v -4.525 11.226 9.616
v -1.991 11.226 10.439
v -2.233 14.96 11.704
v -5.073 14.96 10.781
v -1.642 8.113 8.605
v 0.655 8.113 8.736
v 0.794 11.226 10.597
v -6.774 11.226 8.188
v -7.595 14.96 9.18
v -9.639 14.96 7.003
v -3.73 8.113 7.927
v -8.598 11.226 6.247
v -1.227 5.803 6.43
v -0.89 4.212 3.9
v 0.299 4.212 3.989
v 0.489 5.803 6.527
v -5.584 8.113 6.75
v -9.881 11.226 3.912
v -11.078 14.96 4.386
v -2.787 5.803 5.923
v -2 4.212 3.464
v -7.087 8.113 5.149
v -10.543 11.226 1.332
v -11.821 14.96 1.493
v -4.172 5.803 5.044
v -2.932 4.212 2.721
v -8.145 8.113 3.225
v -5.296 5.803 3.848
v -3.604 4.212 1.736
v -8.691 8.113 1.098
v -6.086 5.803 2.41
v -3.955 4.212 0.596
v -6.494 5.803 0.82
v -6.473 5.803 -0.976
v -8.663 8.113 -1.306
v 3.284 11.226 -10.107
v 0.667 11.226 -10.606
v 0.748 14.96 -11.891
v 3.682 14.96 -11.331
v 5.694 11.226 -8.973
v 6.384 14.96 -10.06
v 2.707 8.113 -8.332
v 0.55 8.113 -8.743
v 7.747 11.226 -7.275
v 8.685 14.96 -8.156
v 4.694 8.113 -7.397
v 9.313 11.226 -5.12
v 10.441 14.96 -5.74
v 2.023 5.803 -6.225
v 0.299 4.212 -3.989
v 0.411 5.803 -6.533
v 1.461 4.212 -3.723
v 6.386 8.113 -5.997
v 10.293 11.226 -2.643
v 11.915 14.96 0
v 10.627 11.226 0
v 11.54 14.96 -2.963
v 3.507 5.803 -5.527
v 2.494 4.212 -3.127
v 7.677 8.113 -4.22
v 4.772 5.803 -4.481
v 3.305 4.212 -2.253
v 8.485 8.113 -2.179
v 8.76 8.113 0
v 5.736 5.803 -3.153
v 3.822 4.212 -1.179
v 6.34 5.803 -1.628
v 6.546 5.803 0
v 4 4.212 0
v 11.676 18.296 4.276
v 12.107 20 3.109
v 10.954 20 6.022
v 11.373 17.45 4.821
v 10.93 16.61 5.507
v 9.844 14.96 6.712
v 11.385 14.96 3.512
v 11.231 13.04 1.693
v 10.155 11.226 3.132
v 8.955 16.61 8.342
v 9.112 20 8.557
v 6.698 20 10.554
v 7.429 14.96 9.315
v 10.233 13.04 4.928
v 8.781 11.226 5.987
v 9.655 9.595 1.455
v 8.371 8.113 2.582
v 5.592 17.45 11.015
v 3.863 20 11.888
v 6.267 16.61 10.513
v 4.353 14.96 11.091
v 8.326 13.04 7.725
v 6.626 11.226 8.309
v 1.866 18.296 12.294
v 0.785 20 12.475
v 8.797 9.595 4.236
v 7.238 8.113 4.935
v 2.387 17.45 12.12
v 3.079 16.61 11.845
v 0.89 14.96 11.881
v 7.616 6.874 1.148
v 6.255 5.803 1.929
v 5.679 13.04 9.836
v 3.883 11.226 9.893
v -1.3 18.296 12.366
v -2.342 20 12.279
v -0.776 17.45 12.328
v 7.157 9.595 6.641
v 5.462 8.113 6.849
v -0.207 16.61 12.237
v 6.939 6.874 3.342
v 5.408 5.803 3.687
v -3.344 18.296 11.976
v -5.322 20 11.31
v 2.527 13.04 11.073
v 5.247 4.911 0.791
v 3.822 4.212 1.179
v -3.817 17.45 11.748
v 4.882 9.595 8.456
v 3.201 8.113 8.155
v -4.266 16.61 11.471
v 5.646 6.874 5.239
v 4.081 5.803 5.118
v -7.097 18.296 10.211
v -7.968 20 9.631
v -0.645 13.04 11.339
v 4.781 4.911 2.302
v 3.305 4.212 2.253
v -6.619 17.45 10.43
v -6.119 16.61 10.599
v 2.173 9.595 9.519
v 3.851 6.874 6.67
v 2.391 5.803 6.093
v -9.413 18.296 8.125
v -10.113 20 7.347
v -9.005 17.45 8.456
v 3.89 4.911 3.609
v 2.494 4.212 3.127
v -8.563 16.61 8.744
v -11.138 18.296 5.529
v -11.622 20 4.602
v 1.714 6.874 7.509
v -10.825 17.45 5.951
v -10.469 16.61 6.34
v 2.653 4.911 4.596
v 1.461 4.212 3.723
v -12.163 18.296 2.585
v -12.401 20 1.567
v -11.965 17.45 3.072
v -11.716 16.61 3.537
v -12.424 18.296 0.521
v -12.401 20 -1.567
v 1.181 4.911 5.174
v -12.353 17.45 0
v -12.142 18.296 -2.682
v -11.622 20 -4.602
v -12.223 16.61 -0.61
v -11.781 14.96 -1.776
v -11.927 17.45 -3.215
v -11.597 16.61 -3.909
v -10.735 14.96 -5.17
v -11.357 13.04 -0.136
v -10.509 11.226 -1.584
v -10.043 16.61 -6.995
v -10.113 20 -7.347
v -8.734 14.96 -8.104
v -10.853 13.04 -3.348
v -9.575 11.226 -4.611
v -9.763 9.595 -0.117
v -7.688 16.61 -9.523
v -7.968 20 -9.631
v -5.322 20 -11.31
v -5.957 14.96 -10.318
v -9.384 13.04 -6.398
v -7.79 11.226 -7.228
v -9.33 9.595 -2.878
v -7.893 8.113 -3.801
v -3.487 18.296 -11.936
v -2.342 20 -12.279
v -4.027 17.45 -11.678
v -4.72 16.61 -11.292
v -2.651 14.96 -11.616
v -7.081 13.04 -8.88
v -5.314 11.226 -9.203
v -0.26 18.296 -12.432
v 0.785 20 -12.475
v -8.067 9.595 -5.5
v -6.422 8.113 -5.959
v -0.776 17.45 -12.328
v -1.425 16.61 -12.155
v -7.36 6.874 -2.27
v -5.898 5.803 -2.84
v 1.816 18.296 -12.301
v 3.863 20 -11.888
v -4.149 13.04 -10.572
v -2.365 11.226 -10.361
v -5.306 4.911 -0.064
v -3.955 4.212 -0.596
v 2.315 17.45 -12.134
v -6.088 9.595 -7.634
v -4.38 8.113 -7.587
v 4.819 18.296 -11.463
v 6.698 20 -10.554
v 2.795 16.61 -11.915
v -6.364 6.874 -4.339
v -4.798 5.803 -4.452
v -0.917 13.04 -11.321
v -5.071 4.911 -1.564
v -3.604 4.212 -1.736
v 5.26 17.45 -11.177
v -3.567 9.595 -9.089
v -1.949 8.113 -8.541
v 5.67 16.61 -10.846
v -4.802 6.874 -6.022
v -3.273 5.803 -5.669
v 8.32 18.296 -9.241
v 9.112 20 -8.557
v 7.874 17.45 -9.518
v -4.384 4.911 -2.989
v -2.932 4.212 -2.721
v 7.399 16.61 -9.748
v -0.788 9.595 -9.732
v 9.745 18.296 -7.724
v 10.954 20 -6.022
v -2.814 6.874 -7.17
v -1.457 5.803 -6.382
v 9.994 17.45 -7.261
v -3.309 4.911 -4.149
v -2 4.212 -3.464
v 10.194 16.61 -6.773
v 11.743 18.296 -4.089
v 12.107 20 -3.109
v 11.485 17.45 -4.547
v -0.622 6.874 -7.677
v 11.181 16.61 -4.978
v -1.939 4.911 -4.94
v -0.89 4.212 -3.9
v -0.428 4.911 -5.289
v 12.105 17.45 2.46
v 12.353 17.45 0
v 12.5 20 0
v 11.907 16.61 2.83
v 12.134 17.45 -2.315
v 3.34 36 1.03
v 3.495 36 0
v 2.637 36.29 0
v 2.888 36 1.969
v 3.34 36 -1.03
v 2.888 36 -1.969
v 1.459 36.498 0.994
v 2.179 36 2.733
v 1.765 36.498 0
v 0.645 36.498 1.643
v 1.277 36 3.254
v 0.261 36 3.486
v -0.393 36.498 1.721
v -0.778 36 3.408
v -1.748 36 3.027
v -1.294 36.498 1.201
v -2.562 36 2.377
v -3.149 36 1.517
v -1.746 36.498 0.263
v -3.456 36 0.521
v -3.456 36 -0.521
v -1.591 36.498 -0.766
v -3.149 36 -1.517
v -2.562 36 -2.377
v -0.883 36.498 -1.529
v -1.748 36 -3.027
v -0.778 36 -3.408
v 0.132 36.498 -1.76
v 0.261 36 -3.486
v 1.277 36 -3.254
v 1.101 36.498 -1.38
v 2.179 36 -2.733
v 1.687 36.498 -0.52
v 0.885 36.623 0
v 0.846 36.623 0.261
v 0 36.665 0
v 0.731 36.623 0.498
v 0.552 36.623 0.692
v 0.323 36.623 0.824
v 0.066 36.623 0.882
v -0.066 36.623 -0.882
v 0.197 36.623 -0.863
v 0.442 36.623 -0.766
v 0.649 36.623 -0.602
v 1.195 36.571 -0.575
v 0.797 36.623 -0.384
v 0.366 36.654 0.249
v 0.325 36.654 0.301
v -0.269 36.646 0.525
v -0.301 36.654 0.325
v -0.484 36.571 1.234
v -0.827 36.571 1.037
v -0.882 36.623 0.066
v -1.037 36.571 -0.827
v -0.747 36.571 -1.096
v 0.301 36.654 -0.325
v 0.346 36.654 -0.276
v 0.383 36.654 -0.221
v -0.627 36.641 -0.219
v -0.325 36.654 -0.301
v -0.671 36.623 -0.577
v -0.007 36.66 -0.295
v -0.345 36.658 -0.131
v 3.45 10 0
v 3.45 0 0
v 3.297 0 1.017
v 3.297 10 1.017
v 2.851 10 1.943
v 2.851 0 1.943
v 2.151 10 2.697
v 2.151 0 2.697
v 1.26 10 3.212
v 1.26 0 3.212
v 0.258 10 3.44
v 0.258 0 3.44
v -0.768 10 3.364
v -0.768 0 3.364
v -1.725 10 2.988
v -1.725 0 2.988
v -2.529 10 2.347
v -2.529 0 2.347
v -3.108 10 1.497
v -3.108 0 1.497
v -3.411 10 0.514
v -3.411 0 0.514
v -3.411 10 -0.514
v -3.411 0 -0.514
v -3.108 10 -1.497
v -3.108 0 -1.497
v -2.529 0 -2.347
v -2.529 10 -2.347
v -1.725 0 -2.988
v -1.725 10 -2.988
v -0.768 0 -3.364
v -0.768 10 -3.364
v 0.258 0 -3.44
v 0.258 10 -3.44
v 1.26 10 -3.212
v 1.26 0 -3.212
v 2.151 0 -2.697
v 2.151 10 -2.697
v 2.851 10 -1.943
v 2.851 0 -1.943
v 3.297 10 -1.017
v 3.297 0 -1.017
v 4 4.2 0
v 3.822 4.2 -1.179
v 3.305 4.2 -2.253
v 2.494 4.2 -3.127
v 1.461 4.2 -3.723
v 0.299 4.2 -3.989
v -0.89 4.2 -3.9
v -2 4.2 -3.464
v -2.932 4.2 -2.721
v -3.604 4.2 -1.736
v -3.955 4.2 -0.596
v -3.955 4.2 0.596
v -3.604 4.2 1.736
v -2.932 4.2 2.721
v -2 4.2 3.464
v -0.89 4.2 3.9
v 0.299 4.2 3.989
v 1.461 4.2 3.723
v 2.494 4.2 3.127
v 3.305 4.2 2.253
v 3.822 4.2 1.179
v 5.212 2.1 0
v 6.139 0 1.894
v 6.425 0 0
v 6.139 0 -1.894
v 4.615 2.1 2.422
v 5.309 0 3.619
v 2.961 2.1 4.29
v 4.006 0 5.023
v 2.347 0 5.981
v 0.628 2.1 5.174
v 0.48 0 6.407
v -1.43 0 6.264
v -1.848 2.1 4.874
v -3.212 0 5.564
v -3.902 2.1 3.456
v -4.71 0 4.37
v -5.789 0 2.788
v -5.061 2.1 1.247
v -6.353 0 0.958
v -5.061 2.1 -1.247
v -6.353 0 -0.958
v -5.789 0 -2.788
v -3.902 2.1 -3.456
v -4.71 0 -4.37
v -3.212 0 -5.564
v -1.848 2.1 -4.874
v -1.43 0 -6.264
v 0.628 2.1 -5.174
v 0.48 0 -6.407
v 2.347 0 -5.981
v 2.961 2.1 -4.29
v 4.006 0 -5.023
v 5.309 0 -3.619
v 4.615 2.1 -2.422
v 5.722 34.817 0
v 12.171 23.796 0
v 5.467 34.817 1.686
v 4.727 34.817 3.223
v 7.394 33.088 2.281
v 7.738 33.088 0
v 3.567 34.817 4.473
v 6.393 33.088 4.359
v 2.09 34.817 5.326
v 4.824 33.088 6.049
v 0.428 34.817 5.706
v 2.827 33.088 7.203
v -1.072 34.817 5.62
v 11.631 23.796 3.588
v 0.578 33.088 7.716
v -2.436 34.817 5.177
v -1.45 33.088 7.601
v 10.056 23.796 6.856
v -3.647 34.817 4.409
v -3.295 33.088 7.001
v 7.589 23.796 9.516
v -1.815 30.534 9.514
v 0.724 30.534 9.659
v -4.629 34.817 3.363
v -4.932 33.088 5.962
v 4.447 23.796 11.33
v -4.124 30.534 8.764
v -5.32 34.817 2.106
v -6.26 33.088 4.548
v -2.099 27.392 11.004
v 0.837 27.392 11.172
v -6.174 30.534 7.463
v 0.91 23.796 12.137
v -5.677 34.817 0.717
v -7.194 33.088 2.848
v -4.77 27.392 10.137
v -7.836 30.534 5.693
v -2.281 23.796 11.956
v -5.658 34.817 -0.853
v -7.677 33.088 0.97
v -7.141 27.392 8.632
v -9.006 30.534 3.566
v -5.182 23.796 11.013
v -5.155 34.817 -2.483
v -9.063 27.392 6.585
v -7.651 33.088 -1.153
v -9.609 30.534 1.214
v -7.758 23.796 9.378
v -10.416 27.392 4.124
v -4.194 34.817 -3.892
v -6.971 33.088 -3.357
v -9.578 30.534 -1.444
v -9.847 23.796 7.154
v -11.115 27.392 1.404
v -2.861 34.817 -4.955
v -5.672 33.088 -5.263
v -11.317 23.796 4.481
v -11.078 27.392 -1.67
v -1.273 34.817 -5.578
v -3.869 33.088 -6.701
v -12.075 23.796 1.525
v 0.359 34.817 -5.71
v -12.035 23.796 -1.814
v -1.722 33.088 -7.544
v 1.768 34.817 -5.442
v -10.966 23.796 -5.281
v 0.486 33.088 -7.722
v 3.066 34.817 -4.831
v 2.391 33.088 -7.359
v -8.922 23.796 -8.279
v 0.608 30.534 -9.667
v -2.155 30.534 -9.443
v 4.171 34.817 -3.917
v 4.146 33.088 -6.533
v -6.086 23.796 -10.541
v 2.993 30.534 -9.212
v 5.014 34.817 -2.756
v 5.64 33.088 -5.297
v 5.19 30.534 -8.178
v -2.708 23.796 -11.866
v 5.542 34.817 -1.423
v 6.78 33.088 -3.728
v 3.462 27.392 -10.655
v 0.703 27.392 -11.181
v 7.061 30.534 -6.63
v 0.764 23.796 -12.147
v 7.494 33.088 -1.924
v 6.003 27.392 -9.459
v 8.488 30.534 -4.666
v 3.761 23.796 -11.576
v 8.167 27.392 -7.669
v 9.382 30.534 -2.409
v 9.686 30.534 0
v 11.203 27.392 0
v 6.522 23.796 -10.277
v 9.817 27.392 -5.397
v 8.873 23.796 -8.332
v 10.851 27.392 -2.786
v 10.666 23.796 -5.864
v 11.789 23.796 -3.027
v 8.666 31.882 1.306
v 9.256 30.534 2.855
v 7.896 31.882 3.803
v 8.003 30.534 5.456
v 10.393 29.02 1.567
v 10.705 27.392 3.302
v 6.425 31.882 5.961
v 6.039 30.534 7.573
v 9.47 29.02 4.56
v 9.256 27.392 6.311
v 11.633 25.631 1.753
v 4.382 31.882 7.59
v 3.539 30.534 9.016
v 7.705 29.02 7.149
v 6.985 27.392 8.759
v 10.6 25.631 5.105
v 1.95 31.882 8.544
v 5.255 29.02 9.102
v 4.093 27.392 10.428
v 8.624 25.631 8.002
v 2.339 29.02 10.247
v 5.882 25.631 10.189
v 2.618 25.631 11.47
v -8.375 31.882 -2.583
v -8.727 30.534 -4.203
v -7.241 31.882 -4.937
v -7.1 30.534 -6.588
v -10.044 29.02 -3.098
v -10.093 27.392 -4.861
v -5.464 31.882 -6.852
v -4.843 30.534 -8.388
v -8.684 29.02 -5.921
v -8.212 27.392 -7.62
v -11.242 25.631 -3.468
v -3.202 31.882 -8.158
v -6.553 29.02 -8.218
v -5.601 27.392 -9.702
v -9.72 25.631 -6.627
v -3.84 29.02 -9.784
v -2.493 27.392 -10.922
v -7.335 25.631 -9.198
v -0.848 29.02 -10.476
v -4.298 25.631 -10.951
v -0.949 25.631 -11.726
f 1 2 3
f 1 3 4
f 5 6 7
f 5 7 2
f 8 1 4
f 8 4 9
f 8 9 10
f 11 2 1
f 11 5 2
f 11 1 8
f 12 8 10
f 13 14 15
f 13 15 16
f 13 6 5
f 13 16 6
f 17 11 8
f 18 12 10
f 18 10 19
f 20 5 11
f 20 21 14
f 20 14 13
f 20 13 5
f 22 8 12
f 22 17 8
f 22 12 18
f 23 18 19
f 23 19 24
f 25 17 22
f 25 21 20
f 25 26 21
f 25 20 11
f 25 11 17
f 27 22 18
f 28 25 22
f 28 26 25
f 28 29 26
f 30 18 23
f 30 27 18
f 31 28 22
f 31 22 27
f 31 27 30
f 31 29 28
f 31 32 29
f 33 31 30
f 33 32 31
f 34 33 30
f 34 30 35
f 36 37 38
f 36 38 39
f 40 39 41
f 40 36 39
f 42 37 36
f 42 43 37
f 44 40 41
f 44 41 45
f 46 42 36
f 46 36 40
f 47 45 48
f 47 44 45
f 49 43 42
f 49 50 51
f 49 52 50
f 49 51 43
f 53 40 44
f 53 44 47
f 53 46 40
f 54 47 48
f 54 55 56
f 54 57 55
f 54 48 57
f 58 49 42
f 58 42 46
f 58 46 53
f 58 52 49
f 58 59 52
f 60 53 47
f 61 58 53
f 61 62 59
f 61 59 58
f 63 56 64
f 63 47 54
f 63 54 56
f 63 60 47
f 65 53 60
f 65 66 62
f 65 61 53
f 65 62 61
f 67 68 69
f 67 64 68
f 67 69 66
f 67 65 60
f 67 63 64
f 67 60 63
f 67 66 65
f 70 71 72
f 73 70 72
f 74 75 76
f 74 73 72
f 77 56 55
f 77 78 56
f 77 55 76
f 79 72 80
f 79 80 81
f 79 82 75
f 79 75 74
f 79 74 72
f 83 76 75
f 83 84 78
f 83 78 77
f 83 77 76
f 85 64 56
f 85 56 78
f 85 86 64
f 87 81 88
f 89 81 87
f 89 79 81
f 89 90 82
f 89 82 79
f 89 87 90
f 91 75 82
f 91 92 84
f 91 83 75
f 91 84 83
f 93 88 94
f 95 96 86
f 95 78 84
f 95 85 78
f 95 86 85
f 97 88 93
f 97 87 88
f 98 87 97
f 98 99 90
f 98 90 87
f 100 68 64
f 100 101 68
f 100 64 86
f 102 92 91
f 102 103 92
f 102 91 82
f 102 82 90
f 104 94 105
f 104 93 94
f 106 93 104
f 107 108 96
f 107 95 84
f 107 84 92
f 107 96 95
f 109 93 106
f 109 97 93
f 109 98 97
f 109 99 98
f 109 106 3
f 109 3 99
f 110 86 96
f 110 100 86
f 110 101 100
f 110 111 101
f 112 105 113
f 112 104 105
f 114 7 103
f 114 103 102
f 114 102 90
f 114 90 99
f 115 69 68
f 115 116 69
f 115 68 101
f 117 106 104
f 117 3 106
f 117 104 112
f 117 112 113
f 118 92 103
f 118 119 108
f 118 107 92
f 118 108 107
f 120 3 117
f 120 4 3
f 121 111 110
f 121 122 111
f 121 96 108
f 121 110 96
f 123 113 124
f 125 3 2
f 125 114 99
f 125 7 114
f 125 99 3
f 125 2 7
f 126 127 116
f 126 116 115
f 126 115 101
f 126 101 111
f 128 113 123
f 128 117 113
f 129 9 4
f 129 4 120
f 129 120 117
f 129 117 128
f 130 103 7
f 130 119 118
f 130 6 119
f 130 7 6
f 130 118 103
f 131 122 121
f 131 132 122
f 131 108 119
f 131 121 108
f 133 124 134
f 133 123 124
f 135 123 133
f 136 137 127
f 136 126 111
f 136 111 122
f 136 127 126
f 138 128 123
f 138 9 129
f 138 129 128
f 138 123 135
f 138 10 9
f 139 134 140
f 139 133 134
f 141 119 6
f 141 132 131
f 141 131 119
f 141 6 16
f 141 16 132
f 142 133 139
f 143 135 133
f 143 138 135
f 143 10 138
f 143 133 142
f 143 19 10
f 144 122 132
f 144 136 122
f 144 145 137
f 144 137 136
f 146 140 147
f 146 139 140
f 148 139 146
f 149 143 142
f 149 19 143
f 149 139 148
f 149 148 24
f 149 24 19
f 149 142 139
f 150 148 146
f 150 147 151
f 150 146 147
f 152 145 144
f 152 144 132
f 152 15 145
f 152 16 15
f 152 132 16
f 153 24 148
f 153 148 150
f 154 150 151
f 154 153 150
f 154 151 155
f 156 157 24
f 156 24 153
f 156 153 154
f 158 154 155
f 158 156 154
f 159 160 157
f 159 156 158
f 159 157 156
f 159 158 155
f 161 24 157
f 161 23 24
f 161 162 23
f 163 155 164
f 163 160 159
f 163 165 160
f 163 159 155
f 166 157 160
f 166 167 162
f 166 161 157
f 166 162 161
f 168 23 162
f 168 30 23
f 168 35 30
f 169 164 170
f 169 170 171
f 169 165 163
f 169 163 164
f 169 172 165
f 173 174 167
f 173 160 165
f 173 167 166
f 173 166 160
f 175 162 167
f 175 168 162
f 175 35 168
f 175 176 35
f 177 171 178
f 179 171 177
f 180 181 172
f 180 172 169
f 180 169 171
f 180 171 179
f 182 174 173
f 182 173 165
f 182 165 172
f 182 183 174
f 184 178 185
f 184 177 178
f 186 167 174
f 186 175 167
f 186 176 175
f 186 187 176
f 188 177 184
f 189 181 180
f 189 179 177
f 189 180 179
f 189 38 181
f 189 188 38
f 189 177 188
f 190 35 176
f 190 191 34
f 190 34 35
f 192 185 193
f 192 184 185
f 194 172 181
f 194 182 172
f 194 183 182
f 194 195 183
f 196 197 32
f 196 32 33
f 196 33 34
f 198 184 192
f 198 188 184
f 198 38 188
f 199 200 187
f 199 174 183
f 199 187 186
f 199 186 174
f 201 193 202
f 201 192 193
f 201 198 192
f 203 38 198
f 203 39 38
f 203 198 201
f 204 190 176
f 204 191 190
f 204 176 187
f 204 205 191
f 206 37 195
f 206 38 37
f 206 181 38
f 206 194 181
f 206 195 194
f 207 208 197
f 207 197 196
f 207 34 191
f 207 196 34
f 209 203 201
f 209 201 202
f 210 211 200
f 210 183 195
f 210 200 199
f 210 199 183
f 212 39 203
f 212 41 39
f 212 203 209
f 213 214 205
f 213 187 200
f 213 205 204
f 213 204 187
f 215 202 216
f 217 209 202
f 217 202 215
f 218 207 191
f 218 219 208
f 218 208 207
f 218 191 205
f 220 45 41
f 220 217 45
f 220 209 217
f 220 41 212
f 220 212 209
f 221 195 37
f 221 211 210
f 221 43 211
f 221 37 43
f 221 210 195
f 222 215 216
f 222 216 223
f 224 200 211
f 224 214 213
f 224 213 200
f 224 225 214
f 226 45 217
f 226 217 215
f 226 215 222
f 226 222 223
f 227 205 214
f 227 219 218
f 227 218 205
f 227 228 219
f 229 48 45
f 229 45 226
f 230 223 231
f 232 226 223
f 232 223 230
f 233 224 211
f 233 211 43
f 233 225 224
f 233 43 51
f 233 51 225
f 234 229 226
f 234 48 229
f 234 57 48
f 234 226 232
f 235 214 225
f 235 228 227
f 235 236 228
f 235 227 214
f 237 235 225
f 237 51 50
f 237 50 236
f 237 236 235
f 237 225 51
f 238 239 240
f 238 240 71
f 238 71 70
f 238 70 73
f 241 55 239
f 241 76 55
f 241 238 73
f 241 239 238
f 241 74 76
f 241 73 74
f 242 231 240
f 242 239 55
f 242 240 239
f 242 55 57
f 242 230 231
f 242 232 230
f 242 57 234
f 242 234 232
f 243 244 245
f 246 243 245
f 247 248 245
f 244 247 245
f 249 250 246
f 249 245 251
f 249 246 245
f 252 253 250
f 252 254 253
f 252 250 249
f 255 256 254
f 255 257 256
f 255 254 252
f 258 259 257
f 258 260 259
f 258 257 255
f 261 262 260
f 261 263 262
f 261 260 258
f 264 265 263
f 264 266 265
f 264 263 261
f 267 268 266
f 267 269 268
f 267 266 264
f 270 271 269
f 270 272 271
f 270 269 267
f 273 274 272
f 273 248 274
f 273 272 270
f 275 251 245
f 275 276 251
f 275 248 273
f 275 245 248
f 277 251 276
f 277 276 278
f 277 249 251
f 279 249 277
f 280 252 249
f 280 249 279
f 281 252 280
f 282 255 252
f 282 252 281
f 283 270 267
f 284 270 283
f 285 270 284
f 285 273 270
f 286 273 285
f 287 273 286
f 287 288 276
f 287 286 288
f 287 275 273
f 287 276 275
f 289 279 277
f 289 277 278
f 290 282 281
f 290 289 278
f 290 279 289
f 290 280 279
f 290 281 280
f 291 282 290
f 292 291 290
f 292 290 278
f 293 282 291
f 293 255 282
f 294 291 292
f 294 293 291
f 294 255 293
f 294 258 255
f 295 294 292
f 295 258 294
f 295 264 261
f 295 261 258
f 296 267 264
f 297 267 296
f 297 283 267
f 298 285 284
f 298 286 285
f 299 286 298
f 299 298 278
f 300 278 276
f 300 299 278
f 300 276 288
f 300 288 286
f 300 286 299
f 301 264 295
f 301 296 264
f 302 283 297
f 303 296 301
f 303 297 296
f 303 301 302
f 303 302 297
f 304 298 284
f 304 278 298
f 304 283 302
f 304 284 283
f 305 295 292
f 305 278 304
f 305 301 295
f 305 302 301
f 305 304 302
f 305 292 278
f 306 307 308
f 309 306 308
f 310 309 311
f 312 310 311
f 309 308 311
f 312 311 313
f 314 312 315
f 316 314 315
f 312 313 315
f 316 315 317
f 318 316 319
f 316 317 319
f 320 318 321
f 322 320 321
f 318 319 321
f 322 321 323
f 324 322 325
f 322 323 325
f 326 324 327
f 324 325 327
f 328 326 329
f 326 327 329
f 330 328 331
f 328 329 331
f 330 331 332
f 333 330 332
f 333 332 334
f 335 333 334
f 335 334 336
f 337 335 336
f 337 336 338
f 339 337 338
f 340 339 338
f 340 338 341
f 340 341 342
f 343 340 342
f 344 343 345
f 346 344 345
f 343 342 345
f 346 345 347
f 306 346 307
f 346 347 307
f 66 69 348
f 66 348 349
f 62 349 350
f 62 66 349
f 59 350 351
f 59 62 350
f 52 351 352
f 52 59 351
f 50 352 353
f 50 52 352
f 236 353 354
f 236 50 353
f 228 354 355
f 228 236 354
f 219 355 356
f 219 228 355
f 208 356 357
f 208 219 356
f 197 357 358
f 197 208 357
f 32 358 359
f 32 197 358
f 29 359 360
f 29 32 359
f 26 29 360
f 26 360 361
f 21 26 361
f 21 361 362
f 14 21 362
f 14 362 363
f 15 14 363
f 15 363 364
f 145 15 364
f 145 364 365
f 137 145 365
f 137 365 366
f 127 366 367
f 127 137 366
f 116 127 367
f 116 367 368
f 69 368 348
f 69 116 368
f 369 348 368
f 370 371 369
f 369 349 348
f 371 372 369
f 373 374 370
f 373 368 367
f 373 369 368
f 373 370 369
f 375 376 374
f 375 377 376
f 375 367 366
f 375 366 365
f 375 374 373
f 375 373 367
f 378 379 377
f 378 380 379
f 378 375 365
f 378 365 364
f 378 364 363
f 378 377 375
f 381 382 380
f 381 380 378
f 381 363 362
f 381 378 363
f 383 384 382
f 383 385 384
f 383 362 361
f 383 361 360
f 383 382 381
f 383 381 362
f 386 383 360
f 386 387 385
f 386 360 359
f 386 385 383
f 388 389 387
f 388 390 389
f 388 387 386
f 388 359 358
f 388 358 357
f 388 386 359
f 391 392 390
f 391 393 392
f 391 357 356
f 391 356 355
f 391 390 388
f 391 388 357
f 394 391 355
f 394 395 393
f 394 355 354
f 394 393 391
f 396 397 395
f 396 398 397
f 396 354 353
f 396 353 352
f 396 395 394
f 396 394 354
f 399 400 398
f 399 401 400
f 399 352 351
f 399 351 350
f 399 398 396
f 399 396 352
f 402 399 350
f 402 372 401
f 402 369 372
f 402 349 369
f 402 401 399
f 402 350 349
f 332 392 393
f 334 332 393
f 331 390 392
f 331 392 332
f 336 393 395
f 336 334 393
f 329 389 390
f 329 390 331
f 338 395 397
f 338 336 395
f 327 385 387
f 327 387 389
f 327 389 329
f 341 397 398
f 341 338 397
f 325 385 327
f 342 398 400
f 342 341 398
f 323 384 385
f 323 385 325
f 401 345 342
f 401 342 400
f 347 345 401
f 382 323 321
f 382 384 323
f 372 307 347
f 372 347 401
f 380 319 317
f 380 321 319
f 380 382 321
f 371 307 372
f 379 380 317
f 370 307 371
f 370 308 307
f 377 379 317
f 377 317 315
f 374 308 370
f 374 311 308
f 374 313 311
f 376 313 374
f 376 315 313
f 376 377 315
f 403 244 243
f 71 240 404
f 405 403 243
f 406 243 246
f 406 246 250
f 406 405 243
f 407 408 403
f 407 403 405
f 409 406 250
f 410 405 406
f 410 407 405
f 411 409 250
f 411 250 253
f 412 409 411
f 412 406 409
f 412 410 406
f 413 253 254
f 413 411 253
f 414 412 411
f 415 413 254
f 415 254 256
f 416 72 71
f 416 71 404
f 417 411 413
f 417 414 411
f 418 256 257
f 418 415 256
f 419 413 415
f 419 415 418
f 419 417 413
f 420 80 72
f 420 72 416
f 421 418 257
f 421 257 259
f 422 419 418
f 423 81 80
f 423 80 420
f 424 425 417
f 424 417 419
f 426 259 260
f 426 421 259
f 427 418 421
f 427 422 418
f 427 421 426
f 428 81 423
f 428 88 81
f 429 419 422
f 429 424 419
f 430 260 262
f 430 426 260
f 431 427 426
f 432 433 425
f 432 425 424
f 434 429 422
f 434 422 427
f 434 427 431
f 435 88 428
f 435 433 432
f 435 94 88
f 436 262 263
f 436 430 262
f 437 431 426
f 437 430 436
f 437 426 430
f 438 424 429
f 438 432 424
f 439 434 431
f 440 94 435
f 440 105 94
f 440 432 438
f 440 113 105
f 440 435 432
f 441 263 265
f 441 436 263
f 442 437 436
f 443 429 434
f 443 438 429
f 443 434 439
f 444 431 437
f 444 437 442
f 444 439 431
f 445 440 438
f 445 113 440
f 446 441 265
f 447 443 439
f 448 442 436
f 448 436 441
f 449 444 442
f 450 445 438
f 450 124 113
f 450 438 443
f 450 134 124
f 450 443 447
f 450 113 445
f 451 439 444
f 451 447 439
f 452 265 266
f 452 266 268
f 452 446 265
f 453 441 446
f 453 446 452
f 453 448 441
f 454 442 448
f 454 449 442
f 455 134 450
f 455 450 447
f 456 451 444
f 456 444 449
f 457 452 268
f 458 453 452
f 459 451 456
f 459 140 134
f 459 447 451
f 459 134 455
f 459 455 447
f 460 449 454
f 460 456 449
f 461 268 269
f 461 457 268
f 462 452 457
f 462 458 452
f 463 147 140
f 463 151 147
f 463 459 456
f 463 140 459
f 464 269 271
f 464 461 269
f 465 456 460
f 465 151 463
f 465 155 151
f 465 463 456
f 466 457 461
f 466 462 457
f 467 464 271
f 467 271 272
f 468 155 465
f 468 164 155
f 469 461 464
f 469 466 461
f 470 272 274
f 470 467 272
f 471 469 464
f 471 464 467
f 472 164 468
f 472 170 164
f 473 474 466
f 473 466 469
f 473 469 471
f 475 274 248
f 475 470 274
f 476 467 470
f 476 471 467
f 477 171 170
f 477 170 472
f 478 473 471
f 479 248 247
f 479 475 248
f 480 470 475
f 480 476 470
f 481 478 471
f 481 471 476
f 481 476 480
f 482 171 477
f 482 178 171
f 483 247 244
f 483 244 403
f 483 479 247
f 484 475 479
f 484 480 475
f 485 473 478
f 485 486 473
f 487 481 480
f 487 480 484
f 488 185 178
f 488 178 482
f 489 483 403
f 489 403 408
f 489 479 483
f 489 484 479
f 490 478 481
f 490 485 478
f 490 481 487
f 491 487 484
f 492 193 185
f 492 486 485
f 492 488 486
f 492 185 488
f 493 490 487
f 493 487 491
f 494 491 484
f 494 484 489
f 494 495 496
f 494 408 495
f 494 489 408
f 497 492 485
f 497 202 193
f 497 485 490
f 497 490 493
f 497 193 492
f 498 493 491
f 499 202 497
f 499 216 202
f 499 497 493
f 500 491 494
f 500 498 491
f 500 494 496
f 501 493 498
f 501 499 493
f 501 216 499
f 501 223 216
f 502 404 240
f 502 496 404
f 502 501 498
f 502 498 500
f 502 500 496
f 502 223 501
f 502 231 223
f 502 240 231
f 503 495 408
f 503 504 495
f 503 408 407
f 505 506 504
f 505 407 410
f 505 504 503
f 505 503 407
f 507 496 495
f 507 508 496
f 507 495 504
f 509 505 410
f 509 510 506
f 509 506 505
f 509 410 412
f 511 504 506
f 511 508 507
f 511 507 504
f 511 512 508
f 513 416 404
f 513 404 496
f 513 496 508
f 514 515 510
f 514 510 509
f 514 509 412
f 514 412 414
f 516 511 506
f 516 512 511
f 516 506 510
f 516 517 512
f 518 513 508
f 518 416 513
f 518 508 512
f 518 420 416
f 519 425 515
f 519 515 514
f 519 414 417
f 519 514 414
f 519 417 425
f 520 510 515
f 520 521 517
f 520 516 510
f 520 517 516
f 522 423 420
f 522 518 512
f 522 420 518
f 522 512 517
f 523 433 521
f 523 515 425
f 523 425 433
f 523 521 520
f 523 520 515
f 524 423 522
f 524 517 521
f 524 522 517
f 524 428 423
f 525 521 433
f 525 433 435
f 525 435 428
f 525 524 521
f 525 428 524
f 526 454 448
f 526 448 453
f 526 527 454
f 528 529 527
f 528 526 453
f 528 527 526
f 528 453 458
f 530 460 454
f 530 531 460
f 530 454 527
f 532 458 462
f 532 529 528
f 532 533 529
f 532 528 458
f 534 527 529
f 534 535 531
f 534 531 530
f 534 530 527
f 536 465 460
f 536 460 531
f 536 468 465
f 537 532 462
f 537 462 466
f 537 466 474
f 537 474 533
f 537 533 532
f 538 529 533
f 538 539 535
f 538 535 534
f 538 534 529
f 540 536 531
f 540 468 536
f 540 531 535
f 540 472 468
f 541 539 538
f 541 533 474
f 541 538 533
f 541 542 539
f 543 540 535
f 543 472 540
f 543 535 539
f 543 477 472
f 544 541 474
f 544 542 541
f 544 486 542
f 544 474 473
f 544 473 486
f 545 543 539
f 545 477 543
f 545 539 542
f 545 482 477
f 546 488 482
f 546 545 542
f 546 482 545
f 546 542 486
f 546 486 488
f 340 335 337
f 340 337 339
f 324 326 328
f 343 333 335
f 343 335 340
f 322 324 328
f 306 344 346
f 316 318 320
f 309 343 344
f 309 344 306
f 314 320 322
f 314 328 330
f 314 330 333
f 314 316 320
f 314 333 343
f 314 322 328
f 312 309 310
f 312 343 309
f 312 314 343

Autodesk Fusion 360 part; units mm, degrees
sketch "Sketch1" plane through (0, 0, 0) normal (0, 0, 1) x (1, 0, 0)
  line L0 (0, 0) -> (12.5, 0)
  line L1 (12.5, 0) -> (12.5, 36)
  line L2 (12.5, 36) -> (0, 36)
  line L3 (0, 36) -> (0, 0)
  line L4 (3, 0) -> (3, 36) construction
  line L5 (4, 0) -> (4, 36) construction
  line L6 (0, 4.2) -> (12.5, 4.2) construction
  line L7 (4, 4.2) -> (6.4249, 0)
  line L8 (4, 4.2) -> (8.8497, 4.2) construction
  line L9 (0, 36) -> (0, 0)
  line L10 (0, 36) -> (0, 36.6648)
  ellipse E0 centre (0, 20) end of major axis (12.5, 20) minor radius 16.6648 (0, 3.3352) -> (0, 36.6648) ccw
  line L11 (4, 4.2) -> (4, 4.2115)
  dimension "d1" = 12.5
  dimension "d2" = 36
  dimension "d3" = 3
  dimension "d4" = 4
  dimension "d5" = 4.2
  dimension "d6" = 60
sketch "Sketch2" plane through (0, 0, 0) normal (0, -1, 0) x (1, 0, 0)
  circle A0 centre (0, 0) radius 3.45
  circle A1 centre (0, 0) radius 6.4249
  dimension "d8" = 6.9
revolve "Revolve2" add sketch "Sketch1" angle 360 about axis through (0, 36, 0) along (0, -1, 0) contours L0 L3 L7 L9 E0 L11 | L2 L3 L9 E0 | L2 L10 E0
extrude "Extrude2" cut sketch "Sketch2" against normal blind 10 contours A0
